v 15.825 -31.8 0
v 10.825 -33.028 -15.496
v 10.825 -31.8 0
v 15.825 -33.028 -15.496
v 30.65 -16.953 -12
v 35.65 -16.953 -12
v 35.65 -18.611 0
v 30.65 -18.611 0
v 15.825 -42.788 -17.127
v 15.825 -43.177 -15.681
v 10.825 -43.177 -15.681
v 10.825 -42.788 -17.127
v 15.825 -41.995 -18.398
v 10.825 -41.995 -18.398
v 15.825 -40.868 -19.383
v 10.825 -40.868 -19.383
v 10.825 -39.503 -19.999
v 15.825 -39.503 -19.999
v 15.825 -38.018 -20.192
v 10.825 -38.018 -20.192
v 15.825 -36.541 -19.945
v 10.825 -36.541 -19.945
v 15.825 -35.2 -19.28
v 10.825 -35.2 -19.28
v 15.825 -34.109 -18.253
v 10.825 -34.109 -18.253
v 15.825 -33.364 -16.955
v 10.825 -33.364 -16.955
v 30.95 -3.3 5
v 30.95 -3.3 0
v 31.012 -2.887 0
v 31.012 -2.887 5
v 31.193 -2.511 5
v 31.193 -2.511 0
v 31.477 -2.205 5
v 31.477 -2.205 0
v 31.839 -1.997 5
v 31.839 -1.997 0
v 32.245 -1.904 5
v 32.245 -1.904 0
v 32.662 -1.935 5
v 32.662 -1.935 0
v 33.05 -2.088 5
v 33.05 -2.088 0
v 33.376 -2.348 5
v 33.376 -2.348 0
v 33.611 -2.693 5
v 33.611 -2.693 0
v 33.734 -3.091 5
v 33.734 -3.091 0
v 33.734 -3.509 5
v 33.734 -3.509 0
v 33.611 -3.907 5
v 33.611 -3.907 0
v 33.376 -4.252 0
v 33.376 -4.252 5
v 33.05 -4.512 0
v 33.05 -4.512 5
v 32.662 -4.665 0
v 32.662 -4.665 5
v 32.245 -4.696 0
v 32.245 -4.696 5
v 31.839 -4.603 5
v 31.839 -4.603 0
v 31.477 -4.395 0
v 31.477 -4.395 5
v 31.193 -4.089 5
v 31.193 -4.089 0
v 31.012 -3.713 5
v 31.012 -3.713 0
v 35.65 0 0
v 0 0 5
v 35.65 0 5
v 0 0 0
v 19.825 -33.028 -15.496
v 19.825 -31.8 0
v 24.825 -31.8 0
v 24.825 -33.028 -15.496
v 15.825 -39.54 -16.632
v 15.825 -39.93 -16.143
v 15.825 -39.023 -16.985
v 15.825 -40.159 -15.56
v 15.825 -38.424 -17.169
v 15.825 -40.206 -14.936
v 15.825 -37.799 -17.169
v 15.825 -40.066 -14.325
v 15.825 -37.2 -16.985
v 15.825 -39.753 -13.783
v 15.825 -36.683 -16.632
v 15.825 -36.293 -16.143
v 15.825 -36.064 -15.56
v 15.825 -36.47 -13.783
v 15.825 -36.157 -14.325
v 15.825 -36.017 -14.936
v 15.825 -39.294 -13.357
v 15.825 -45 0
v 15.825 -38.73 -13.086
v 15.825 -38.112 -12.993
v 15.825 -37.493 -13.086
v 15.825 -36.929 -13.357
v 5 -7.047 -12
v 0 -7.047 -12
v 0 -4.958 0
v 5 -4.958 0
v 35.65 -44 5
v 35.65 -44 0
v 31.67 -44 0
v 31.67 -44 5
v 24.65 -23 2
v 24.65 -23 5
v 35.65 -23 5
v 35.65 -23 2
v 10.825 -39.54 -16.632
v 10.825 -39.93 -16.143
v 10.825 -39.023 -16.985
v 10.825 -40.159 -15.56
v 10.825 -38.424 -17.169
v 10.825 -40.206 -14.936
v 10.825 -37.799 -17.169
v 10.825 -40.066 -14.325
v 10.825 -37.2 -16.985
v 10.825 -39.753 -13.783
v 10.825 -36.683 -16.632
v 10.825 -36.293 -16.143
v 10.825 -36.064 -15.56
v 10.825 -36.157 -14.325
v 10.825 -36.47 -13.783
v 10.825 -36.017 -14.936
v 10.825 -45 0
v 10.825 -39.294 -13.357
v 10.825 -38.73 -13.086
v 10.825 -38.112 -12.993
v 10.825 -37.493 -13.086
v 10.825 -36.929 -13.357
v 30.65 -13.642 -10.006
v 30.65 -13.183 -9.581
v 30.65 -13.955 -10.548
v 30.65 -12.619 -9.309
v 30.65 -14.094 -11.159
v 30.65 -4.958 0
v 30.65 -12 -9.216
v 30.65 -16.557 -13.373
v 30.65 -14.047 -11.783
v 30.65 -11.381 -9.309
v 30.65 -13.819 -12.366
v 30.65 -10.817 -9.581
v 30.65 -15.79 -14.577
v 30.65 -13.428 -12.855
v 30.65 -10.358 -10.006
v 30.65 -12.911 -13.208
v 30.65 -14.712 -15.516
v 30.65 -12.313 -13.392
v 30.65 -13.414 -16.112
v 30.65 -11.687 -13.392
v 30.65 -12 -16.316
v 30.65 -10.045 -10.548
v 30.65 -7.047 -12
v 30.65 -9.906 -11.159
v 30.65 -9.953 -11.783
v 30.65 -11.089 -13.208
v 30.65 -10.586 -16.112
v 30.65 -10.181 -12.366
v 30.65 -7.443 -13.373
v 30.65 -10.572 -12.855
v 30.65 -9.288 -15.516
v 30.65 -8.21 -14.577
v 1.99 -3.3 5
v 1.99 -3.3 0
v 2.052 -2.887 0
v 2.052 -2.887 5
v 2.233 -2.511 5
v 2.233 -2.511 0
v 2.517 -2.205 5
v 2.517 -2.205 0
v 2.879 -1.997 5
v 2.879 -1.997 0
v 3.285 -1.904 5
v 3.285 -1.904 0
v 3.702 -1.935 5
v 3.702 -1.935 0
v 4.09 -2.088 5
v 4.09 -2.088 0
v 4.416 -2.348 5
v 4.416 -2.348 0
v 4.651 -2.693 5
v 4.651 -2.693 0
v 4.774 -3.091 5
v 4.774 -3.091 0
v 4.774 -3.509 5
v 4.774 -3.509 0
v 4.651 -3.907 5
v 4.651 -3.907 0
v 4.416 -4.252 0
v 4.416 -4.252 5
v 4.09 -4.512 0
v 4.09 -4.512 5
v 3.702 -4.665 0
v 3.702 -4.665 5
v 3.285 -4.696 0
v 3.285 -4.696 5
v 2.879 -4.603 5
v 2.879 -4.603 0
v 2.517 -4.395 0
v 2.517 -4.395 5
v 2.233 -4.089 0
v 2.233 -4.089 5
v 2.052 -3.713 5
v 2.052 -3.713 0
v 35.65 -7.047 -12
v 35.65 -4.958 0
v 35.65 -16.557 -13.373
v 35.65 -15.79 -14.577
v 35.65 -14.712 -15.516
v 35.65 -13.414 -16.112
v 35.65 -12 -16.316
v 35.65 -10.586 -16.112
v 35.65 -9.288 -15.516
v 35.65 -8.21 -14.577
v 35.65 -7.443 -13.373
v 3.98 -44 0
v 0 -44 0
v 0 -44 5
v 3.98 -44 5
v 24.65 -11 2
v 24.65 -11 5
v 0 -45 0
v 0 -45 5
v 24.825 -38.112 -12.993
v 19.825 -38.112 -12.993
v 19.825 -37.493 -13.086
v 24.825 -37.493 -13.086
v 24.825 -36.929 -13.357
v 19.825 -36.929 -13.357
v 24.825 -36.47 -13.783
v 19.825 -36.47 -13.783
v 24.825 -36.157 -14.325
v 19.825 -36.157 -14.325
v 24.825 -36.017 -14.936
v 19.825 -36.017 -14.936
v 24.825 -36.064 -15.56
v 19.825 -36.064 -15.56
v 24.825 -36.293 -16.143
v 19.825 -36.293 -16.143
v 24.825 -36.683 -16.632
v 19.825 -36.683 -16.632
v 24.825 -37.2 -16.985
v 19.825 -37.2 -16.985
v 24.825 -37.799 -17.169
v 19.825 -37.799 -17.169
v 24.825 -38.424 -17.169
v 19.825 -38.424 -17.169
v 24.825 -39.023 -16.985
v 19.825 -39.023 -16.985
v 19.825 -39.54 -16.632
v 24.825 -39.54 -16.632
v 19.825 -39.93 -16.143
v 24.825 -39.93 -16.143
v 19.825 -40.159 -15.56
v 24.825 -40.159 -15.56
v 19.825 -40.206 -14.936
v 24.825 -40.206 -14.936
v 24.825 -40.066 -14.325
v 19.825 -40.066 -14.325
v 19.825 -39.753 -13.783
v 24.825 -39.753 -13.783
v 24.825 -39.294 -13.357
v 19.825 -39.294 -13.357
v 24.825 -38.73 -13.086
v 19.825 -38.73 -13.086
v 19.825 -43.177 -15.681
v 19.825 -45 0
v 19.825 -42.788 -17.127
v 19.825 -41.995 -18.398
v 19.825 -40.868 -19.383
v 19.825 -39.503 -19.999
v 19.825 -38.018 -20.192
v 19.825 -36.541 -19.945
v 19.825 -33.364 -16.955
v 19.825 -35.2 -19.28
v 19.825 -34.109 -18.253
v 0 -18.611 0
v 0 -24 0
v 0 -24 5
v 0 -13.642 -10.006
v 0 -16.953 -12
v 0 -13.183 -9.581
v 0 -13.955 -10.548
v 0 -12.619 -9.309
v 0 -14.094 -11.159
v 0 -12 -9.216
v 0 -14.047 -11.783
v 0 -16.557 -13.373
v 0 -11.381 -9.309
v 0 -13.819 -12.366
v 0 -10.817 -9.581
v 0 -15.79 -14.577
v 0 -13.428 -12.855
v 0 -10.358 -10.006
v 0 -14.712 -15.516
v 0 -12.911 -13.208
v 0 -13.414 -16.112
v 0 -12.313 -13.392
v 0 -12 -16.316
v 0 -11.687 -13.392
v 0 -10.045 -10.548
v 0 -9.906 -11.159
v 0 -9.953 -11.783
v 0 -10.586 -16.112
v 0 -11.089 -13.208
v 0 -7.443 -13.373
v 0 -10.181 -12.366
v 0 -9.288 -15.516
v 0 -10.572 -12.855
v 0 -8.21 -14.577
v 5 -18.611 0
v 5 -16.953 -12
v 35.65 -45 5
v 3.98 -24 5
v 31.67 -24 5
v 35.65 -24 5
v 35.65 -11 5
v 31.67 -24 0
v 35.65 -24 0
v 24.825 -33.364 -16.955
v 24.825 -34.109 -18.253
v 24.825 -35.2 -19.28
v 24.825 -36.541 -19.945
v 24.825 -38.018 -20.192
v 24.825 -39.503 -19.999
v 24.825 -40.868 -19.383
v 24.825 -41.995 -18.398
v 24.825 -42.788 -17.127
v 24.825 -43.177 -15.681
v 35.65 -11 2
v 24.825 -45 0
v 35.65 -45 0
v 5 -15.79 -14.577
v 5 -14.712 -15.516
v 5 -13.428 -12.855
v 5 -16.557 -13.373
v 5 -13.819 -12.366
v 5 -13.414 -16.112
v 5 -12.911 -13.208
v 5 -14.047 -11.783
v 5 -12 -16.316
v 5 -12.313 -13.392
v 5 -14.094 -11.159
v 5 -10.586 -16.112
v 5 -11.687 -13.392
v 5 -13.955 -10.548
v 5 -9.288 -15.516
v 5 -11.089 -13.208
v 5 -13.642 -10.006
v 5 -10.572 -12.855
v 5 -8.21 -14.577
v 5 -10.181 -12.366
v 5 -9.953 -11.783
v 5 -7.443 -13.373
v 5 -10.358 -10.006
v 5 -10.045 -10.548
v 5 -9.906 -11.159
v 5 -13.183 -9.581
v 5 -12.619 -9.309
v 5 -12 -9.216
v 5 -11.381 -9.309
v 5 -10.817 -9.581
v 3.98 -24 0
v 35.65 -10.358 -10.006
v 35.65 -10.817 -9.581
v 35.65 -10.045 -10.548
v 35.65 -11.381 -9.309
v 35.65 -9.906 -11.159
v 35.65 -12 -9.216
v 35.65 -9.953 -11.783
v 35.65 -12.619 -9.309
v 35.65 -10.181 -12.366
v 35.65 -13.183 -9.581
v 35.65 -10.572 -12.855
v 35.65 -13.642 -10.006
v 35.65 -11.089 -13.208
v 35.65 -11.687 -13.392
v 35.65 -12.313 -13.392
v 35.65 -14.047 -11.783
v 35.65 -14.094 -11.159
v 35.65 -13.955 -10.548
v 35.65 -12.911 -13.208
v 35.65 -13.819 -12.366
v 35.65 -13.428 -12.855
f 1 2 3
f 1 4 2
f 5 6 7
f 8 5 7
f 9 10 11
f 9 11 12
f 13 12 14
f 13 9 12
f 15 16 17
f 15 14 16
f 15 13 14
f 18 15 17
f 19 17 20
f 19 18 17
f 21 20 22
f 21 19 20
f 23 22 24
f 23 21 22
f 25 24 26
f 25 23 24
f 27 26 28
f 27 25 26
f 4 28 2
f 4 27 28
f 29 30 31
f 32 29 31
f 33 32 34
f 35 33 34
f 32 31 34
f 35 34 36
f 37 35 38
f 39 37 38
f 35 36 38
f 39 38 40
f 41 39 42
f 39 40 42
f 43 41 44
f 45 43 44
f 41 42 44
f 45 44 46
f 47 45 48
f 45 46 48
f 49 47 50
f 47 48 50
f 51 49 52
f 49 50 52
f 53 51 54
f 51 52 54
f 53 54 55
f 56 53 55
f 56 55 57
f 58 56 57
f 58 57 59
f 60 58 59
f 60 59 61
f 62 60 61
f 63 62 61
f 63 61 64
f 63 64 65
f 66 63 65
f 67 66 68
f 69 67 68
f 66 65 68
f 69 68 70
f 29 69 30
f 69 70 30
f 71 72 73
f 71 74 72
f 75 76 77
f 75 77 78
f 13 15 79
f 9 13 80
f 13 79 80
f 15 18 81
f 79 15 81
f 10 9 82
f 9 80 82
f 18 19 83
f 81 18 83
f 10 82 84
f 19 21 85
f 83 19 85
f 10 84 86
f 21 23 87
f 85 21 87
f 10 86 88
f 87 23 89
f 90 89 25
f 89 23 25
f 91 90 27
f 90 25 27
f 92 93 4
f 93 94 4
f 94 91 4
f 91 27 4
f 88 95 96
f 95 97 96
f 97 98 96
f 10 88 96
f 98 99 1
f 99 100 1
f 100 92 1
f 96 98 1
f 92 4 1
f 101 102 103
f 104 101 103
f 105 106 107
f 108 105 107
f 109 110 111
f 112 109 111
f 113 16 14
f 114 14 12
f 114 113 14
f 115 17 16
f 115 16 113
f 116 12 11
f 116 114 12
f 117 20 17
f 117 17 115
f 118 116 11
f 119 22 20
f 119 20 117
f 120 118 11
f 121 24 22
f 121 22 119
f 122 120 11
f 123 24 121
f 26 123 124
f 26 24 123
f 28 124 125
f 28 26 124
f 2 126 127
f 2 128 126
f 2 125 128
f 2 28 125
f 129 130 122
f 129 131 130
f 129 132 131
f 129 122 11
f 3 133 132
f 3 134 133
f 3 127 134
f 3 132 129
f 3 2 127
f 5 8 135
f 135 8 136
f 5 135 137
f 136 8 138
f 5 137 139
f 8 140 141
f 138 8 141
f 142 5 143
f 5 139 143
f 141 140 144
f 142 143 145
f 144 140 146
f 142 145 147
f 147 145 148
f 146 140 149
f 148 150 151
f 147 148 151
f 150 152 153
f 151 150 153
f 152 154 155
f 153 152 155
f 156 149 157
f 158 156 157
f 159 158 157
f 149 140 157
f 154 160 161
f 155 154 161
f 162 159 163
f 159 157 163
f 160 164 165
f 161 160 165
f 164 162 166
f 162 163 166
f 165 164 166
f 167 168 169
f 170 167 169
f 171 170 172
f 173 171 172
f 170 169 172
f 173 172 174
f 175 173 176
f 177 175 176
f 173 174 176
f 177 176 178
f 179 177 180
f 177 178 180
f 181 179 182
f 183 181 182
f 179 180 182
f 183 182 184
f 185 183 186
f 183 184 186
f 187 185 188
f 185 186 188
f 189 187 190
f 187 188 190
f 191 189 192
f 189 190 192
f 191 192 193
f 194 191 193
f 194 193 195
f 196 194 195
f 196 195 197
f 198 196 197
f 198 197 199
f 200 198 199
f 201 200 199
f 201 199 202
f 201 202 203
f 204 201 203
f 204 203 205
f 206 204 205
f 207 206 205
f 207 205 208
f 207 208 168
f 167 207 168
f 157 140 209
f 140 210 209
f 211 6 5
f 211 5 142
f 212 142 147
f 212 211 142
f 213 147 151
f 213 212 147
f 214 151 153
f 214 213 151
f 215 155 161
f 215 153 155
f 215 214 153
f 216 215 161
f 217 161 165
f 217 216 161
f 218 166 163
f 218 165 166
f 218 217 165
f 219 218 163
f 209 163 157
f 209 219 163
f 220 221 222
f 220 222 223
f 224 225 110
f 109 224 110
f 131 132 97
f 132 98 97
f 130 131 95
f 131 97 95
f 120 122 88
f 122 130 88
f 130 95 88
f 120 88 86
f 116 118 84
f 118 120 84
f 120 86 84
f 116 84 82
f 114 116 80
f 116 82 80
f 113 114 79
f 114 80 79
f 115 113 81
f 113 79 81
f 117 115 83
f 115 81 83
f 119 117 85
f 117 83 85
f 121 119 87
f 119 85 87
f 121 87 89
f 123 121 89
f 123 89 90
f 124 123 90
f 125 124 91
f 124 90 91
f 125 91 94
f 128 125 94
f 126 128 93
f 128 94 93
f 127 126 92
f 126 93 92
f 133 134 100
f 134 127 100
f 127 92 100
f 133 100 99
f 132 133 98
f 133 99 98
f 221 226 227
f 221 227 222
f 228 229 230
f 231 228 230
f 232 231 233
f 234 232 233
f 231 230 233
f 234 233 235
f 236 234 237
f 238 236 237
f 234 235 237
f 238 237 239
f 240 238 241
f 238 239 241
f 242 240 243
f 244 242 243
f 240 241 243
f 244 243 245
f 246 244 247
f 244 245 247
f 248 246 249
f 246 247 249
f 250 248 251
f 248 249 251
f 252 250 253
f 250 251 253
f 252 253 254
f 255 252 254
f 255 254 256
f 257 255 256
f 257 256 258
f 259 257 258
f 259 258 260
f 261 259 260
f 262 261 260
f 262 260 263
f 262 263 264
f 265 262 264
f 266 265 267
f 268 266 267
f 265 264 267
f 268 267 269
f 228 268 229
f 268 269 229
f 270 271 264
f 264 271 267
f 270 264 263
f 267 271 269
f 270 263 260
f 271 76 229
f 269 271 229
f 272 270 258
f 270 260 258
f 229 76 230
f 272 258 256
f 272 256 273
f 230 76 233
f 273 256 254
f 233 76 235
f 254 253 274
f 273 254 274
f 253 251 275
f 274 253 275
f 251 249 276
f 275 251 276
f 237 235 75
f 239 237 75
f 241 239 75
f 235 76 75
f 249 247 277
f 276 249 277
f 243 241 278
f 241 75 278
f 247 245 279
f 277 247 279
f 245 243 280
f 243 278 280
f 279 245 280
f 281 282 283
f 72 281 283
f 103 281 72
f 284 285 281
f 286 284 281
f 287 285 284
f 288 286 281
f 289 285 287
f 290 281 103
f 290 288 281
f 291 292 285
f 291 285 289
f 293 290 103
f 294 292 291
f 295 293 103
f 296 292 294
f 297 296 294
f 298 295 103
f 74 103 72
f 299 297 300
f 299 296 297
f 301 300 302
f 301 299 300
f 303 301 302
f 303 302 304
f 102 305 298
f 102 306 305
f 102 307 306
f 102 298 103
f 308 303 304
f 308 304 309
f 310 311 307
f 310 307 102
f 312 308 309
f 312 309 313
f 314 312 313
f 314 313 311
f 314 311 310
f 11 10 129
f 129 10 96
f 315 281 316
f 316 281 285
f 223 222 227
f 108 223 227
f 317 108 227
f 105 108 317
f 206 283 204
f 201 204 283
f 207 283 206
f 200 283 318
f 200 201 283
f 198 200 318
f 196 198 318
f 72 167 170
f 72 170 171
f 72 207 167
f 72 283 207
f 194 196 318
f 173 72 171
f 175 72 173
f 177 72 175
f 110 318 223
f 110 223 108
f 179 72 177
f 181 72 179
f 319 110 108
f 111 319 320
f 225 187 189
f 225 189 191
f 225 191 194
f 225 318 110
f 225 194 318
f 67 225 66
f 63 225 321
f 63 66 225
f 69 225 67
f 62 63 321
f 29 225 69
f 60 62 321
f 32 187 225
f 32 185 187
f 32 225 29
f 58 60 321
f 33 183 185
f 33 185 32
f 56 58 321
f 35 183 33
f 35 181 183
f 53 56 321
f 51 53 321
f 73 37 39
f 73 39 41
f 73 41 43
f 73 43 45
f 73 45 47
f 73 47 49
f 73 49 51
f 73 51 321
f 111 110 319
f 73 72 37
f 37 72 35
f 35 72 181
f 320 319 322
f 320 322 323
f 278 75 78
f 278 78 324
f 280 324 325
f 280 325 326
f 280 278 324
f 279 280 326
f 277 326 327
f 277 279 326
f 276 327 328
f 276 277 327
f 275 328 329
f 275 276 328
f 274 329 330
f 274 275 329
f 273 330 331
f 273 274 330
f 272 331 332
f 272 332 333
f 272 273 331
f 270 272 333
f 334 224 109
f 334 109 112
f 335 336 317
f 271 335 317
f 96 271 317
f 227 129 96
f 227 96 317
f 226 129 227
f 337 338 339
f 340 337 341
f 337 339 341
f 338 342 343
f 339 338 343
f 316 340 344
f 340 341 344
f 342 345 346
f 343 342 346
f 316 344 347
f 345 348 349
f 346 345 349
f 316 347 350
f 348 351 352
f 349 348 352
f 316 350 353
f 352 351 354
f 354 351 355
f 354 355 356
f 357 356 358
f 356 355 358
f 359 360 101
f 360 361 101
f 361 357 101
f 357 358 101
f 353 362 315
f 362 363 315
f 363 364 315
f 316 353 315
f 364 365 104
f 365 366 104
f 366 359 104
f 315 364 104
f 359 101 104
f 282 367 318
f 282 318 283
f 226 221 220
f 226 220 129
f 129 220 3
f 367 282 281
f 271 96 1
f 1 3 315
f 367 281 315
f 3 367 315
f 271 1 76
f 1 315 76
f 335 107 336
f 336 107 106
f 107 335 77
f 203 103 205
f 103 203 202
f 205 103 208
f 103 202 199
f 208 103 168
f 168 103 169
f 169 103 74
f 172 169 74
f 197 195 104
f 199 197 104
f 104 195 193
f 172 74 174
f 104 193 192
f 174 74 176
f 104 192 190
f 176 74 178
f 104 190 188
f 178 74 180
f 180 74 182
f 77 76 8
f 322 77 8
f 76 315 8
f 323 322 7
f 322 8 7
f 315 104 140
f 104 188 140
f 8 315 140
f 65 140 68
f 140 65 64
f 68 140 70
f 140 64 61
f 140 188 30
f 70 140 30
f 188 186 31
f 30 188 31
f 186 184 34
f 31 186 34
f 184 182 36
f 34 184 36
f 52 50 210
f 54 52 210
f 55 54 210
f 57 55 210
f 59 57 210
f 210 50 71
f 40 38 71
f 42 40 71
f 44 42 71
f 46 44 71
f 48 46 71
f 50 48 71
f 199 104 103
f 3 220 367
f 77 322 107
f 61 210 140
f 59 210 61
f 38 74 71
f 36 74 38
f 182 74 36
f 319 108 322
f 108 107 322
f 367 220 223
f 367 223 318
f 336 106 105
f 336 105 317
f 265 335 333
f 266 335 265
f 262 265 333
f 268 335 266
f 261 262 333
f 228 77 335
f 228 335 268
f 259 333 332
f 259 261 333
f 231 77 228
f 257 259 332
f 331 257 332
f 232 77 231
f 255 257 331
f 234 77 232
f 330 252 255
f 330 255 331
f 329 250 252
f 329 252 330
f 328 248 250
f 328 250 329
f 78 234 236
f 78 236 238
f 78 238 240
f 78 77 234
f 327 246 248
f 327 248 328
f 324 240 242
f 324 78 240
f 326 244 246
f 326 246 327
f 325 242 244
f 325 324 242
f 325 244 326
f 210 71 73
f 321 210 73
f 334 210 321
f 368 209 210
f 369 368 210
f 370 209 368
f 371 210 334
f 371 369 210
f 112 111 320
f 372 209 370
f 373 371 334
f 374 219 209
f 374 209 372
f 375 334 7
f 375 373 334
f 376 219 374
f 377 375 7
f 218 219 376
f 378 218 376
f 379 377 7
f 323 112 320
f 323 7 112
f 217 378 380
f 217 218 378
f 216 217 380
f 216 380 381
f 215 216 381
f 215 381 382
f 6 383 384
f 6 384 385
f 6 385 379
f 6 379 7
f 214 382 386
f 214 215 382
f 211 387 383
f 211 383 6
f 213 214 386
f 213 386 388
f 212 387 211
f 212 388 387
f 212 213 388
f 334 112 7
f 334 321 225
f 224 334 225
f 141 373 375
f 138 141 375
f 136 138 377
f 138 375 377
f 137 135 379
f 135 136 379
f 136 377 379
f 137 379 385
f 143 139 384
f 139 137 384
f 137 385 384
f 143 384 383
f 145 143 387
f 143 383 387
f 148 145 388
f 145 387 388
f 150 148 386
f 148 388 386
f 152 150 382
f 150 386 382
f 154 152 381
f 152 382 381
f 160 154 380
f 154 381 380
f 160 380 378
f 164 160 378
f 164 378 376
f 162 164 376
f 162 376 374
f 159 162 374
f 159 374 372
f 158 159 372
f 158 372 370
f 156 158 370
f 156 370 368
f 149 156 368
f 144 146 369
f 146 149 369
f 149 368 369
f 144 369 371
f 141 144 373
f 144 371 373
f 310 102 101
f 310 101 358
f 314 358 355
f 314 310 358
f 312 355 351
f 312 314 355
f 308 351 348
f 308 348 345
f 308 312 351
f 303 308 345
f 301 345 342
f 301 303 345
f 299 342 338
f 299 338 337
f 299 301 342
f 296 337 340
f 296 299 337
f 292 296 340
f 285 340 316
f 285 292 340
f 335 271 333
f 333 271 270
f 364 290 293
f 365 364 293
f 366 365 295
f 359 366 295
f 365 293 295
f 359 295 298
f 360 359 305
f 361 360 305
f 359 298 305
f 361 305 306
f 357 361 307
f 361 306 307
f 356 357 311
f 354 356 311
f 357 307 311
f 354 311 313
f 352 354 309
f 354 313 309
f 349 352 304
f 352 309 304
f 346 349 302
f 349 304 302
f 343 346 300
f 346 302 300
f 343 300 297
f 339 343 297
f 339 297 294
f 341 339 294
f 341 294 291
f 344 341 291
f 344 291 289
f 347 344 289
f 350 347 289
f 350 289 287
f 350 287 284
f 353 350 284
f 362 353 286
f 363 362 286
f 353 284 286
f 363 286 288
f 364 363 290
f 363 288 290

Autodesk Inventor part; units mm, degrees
ref_plane "YZ Plane" through (0, 0, 0) normal (1, 0, 0) x (0, 1, 0)
ref_plane "XZ Plane" through (0, 0, 0) normal (0, 1, 0) x (-1, 0, 0)
ref_plane "XY Plane" through (0, 0, 0) normal (0, 0, 1) x (1, 0, 0)
sketch "Эскиз1" plane through (0, 0, 0) normal (0, 0, 1) x (1, 0, 0)
  line L0 (0, 0) -> (35.65, 0)
  line L1 (35.65, 0) -> (35.65, -45)
  line L2 (35.65, -45) -> (0, -45)
  line L3 (0, -45) -> (0, 0)
  dimension "d0" = 35.65
  dimension "d1" = 45
extrude "Выдавливание1" add sketch "Эскиз1" along normal blind 5
sketch "Эскиз5" plane through (0, -45, 0) normal (-1, 0, 0) x (0, 0, 1)
  line L0 (0, 0) -> (0, 45) projected
  line L1 (0, 26.3892) -> (-12, 28.047)
  circle A0 centre (-11.3157, 33) radius 5
  circle A1 centre (-11.3157, 33) radius 2.1
  line L2 (0, 45) -> (5, 45) projected
  line L3 (-12, 37.953) -> (0, 40.0416)
  point P0 (0, 38.3892)
  point P1 (-10.5919, 37.9473)
  point P2 (-11.2301, 37.9993)
  point P3 (0, 41.0557)
  dimension "d4" = 4.2
  dimension "d5" = 10
  dimension "d8" = 12
  dimension "d9" = 12
  dimension "d10" = 12
  dimension "d18" = 12
extrude "Выдавливание2" add sketch "Эскиз5" against normal blind 5
ref_plane "РабПлоскость1" through (17.825, -45, 5) normal (-1, 0, 0) x (0, 0, 1)
mirror "Зеркальное отражение1" about plane through (17.825, -45, 5) normal (-1, 0, 0) of "Выдавливание2"
sketch "Эскиз7" plane through (0, 0, 0) normal (0, 0, -1) x (-1, 0, 0)
  circle A0 centre (-32.35, -3.3) radius 1.4 projected
  circle A1 centre (-3.39, -3.3) radius 1.4 projected
  line L0 (-3.9799, -24) -> (1.0201, -24)
  line L1 (1.0201, -24) -> (1.0201, -44)
  line L2 (1.0201, -44) -> (-3.9799, -44)
  line L3 (-3.9799, -44) -> (-3.9799, -24)
  line L4 (0, -45) -> (-35.65, -45) construction
  line L5 (-17.825, -45) -> (-17.825, 0) construction
  line L6 (-35.65, 0) -> (0, 0) construction
  line L7 (-31.6701, -24) -> (-36.6701, -24)
  line L8 (-36.6701, -24) -> (-36.6701, -44)
  line L9 (-36.6701, -44) -> (-31.6701, -44)
  line L10 (-31.6701, -44) -> (-31.6701, -24)
  line L11 (0, 0) -> (0, -45) construction
  point P0 (0, -18.6108)
  dimension "d14" = 1
  dimension "d15" = 20
  dimension "d24" = 5
extrude "Выдавливание3" cut sketch "Эскиз7" against normal through all
sketch "Эскиз9" plane through (0, 0, 5) normal (0, 0, 1) x (1, 0, 0)
  line L0 (35.65, -45) -> (35.65, 0) projected
  line L1 (35.65, -11) -> (24.65, -11)
  line L2 (24.65, -11) -> (24.65, -23)
  line L3 (24.65, -23) -> (35.65, -23)
  line L4 (35.65, -23) -> (35.65, -11)
  point P0 (0, 0)
  dimension "d19" = 11
  dimension "d20" = 12
  dimension "d21" = 11
extrude "Выдавливание4" cut sketch "Эскиз9" against normal blind 3
ref_plane "РабПлоскость2" through (15.825, -45, 5) normal (-1, 0, 0) x (0, 0, 1)
sketch "Эскиз10" plane through (15.825, -45, 5) normal (-1, 0, 0) x (0, 0, 1)
  circle A0 centre (-20.0926, 6.8885) radius 5.1
  circle A1 centre (-20.0926, 6.8885) radius 2.1
  line L0 (-20.6814, 1.8226) -> (-5, 0)
  line L1 (-5, 11.6783) -> (-5, 0)
  line L2 (-20.4955, 11.9725) -> (-5, 13.2004)
  line L3 (-5, 1) -> (-5, 21) projected
  point P0 (-5, 45)
  point P1 (-20.9797, 11.9107)
  point P2 (-22.1404, 2.2176)
  point P3 (-20.6271, 11.9604)
  dimension "d28" = 4.2
  dimension "d29" = 10.2
extrude "Выдавливание5" add sketch "Эскиз10" along normal blind 5
mirror "Зеркальное отражение2" about plane through (17.825, -45, 5) normal (-1, 0, 0) of "Выдавливание5"
ref_plane "РабПлоскость3" through (17.825, 0, 5) normal (1, 0, 0) x (0, 0, -1)
properties part number "Качель камеры"
